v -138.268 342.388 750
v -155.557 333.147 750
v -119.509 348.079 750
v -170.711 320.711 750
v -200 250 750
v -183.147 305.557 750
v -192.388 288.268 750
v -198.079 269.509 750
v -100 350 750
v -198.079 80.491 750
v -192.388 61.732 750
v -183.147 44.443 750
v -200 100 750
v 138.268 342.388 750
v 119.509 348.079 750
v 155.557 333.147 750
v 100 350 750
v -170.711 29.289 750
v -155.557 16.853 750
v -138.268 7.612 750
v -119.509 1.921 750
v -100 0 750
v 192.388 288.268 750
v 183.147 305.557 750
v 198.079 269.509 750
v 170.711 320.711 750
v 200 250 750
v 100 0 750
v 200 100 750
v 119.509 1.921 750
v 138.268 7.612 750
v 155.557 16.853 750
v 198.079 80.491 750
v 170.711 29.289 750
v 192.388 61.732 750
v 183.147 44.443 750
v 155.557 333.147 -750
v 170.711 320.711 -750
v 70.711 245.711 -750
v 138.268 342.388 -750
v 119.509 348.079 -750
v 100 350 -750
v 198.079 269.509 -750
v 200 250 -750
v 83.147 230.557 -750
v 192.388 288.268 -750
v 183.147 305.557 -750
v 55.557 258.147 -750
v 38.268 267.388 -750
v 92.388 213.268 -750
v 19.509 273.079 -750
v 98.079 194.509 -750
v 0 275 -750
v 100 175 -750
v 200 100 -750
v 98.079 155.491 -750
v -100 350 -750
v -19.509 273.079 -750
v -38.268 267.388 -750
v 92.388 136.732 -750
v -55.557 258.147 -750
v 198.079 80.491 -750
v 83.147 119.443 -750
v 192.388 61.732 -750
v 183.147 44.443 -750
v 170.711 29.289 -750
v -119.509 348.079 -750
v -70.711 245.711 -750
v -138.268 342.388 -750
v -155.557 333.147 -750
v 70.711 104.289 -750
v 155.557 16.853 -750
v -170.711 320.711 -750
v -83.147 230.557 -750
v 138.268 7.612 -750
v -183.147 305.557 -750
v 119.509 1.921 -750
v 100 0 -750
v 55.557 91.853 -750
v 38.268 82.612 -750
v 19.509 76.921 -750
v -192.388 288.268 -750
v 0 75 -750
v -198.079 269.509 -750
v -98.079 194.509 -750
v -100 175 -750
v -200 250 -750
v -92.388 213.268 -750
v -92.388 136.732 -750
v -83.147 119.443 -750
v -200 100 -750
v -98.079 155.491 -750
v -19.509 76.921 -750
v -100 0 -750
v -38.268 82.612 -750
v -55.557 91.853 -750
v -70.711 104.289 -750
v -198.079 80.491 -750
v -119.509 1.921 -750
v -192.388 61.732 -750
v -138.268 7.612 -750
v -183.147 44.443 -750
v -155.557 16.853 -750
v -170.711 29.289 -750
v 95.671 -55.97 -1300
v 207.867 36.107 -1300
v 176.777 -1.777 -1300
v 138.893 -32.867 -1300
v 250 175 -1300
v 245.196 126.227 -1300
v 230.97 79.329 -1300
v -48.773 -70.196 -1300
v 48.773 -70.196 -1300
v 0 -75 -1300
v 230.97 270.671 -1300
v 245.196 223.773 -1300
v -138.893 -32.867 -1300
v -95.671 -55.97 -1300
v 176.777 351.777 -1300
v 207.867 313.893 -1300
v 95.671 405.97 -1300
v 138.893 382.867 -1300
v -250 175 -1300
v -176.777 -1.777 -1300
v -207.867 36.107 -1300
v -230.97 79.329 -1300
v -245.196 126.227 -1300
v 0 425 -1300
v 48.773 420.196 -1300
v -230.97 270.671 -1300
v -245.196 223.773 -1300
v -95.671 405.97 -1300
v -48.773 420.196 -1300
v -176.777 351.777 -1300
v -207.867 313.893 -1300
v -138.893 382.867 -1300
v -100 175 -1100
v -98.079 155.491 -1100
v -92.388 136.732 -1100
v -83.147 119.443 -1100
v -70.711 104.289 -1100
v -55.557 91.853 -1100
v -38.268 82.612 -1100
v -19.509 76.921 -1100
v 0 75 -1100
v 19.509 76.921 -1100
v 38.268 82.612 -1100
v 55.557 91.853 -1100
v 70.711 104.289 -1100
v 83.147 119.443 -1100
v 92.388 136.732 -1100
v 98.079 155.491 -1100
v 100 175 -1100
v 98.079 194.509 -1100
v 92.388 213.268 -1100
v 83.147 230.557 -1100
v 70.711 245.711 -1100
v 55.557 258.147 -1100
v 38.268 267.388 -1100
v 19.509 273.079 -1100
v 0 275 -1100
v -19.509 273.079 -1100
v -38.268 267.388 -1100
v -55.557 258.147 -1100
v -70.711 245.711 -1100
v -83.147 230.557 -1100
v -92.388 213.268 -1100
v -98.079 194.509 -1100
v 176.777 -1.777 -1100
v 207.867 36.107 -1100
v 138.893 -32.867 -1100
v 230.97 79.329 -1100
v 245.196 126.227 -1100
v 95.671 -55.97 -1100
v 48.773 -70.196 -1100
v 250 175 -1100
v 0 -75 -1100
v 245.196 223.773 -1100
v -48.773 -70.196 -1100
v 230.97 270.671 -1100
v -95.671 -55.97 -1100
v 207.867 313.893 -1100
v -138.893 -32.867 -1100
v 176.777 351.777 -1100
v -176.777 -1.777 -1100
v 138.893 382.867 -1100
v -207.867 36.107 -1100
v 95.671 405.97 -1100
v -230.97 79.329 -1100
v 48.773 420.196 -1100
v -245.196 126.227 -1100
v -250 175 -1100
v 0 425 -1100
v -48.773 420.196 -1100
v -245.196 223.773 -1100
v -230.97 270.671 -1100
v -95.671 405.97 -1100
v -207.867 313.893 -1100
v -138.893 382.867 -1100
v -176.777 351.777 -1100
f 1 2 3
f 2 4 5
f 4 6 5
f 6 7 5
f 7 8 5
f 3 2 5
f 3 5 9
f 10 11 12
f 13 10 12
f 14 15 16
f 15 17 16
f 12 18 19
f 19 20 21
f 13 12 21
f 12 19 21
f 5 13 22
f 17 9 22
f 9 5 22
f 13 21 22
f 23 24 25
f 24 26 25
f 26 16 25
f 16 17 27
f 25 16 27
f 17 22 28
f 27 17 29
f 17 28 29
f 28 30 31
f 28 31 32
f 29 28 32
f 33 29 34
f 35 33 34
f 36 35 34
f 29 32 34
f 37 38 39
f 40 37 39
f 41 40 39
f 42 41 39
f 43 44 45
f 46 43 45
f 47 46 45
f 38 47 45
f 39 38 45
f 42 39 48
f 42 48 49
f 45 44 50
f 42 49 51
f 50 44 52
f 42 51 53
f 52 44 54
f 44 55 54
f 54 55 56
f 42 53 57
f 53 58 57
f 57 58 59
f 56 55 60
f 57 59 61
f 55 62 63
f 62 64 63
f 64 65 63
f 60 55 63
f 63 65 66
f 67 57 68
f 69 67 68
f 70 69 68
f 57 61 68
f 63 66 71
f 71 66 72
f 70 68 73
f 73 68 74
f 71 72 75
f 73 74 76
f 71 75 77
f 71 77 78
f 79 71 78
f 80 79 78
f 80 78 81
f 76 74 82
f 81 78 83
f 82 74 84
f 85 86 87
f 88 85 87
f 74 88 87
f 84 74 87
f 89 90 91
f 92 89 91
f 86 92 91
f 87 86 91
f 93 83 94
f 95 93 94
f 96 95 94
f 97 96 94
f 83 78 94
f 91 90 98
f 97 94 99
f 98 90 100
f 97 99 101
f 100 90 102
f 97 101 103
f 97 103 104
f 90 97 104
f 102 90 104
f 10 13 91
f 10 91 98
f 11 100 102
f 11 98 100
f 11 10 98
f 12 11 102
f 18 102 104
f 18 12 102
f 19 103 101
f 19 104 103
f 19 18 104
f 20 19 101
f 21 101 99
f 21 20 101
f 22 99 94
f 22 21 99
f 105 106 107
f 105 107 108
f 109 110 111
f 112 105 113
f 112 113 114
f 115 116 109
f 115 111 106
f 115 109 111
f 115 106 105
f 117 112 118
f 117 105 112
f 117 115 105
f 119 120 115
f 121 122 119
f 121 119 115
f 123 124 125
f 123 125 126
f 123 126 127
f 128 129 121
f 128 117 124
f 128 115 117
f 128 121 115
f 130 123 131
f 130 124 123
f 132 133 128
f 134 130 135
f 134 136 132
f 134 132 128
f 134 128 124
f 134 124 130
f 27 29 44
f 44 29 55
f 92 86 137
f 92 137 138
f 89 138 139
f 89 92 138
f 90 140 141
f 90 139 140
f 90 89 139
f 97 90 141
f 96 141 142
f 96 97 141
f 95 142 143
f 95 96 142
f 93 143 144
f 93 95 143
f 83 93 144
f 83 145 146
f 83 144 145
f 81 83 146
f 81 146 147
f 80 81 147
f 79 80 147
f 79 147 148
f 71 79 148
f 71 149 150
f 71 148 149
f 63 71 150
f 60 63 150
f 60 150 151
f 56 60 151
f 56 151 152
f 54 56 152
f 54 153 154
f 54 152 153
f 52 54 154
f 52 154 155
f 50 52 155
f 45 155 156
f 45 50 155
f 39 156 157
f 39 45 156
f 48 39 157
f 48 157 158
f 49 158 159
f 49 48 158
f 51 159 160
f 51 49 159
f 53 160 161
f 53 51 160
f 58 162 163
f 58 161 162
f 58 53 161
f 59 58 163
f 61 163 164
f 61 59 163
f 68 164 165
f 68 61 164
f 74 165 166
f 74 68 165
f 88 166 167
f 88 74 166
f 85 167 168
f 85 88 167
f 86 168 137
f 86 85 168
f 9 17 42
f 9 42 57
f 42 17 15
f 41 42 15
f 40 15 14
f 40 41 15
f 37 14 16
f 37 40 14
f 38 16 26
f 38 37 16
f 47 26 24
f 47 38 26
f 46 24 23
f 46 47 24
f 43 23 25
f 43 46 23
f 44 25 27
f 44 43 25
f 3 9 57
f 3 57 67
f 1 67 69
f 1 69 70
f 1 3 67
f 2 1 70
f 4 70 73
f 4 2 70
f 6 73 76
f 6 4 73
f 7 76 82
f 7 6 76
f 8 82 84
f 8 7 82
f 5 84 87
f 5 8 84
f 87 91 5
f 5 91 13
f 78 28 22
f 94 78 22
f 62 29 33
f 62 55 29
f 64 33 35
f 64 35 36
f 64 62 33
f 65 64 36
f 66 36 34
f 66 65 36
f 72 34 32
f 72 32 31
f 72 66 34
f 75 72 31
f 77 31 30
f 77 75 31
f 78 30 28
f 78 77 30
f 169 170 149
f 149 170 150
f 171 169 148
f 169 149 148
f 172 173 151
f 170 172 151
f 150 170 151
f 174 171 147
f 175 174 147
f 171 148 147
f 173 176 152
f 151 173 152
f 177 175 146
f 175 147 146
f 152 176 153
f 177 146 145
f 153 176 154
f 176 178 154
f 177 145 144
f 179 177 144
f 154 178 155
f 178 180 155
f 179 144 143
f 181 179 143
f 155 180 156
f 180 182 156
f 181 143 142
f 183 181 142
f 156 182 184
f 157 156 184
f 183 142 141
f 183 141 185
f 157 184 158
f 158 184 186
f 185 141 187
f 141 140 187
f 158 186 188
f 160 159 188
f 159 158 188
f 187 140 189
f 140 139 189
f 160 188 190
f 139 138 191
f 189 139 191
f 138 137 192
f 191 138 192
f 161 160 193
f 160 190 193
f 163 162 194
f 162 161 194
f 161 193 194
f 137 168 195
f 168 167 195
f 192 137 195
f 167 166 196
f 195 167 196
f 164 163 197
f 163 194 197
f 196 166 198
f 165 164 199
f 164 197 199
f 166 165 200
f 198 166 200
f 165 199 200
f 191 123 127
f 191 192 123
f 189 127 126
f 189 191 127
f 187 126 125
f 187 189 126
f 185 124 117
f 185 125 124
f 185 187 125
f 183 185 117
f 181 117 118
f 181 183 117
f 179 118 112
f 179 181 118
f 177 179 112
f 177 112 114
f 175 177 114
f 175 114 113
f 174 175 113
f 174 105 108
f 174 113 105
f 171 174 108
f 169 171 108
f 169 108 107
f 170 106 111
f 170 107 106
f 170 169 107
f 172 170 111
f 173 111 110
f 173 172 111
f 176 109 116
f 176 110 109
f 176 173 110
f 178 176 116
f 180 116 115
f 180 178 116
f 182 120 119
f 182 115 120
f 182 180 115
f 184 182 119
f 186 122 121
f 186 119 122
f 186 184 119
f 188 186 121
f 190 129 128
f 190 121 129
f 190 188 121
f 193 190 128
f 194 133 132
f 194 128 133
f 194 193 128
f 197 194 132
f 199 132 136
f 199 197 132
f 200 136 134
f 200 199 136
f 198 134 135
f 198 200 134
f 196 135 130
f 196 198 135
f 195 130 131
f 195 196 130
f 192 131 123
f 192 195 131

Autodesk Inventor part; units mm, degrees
ref_plane "YZ Plane" through (0, 0, 0) normal (1, 0, 0) x (0, 1, 0)
ref_plane "XZ Plane" through (0, 0, 0) normal (0, 1, 0) x (-1, 0, 0)
ref_plane "XY Plane" through (0, 0, 0) normal (0, 0, 1) x (1, 0, 0)
sketch "Sketch1" plane through (0, 0, 0) normal (0, 1, 0) x (-1, 0, 0)
  line L0 (200, 750) -> (-200, 750)
  line L1 (-200, 750) -> (-200, -750)
  line L2 (-200, -750) -> (200, -750)
  line L3 (200, -750) -> (200, 750)
  line L4 (200, 0) -> (-200, 0) construction
  line L5 (0, -750) -> (0, 750) construction
  point P0 (0, 0)
  point P1 (0, 0)
  dimension "d0" = 1500
  dimension "d1" = 400
extrude "Extrusion1" add sketch "Sketch1" along normal blind 350
sketch "Sketch2" plane through (200, 0, -750) normal (0, 0, -1) x (-1, 0, 0)
  line L0 (200, 0) -> (200, 350) construction
  line L1 (400, 350) -> (0, 350) construction
  line L2 (400, 0) -> (400, 350) construction
  line L3 (400, 175) -> (0, 175) construction
  line L4 (0, 0) -> (0, 350) construction
  circle A0 centre (200, 175) radius 100
  dimension "d4" = 200
extrude "Extrusion2" add sketch "Sketch2" along normal blind 350
sketch "Sketch3" plane through (0, 175, -1100) normal (0, 0, -1) x (-1, 0, 0)
  line L0 (-200, 175) -> (200, 175) construction
  line L1 (0, 175) -> (0, -175) construction
  circle A0 centre (0, 0) radius 100 construction
  circle A1 centre (0, 0) radius 250
  dimension "d7" = 500
extrude "Extrusion3" add sketch "Sketch3" along normal blind 200
fillet "Fillet1" radius 100 4 edges at (200, 350, 0) (-200, 350, 0) (200, 0, 0) (-200, 0, 0)
properties part number "car suspension wheel joint"
